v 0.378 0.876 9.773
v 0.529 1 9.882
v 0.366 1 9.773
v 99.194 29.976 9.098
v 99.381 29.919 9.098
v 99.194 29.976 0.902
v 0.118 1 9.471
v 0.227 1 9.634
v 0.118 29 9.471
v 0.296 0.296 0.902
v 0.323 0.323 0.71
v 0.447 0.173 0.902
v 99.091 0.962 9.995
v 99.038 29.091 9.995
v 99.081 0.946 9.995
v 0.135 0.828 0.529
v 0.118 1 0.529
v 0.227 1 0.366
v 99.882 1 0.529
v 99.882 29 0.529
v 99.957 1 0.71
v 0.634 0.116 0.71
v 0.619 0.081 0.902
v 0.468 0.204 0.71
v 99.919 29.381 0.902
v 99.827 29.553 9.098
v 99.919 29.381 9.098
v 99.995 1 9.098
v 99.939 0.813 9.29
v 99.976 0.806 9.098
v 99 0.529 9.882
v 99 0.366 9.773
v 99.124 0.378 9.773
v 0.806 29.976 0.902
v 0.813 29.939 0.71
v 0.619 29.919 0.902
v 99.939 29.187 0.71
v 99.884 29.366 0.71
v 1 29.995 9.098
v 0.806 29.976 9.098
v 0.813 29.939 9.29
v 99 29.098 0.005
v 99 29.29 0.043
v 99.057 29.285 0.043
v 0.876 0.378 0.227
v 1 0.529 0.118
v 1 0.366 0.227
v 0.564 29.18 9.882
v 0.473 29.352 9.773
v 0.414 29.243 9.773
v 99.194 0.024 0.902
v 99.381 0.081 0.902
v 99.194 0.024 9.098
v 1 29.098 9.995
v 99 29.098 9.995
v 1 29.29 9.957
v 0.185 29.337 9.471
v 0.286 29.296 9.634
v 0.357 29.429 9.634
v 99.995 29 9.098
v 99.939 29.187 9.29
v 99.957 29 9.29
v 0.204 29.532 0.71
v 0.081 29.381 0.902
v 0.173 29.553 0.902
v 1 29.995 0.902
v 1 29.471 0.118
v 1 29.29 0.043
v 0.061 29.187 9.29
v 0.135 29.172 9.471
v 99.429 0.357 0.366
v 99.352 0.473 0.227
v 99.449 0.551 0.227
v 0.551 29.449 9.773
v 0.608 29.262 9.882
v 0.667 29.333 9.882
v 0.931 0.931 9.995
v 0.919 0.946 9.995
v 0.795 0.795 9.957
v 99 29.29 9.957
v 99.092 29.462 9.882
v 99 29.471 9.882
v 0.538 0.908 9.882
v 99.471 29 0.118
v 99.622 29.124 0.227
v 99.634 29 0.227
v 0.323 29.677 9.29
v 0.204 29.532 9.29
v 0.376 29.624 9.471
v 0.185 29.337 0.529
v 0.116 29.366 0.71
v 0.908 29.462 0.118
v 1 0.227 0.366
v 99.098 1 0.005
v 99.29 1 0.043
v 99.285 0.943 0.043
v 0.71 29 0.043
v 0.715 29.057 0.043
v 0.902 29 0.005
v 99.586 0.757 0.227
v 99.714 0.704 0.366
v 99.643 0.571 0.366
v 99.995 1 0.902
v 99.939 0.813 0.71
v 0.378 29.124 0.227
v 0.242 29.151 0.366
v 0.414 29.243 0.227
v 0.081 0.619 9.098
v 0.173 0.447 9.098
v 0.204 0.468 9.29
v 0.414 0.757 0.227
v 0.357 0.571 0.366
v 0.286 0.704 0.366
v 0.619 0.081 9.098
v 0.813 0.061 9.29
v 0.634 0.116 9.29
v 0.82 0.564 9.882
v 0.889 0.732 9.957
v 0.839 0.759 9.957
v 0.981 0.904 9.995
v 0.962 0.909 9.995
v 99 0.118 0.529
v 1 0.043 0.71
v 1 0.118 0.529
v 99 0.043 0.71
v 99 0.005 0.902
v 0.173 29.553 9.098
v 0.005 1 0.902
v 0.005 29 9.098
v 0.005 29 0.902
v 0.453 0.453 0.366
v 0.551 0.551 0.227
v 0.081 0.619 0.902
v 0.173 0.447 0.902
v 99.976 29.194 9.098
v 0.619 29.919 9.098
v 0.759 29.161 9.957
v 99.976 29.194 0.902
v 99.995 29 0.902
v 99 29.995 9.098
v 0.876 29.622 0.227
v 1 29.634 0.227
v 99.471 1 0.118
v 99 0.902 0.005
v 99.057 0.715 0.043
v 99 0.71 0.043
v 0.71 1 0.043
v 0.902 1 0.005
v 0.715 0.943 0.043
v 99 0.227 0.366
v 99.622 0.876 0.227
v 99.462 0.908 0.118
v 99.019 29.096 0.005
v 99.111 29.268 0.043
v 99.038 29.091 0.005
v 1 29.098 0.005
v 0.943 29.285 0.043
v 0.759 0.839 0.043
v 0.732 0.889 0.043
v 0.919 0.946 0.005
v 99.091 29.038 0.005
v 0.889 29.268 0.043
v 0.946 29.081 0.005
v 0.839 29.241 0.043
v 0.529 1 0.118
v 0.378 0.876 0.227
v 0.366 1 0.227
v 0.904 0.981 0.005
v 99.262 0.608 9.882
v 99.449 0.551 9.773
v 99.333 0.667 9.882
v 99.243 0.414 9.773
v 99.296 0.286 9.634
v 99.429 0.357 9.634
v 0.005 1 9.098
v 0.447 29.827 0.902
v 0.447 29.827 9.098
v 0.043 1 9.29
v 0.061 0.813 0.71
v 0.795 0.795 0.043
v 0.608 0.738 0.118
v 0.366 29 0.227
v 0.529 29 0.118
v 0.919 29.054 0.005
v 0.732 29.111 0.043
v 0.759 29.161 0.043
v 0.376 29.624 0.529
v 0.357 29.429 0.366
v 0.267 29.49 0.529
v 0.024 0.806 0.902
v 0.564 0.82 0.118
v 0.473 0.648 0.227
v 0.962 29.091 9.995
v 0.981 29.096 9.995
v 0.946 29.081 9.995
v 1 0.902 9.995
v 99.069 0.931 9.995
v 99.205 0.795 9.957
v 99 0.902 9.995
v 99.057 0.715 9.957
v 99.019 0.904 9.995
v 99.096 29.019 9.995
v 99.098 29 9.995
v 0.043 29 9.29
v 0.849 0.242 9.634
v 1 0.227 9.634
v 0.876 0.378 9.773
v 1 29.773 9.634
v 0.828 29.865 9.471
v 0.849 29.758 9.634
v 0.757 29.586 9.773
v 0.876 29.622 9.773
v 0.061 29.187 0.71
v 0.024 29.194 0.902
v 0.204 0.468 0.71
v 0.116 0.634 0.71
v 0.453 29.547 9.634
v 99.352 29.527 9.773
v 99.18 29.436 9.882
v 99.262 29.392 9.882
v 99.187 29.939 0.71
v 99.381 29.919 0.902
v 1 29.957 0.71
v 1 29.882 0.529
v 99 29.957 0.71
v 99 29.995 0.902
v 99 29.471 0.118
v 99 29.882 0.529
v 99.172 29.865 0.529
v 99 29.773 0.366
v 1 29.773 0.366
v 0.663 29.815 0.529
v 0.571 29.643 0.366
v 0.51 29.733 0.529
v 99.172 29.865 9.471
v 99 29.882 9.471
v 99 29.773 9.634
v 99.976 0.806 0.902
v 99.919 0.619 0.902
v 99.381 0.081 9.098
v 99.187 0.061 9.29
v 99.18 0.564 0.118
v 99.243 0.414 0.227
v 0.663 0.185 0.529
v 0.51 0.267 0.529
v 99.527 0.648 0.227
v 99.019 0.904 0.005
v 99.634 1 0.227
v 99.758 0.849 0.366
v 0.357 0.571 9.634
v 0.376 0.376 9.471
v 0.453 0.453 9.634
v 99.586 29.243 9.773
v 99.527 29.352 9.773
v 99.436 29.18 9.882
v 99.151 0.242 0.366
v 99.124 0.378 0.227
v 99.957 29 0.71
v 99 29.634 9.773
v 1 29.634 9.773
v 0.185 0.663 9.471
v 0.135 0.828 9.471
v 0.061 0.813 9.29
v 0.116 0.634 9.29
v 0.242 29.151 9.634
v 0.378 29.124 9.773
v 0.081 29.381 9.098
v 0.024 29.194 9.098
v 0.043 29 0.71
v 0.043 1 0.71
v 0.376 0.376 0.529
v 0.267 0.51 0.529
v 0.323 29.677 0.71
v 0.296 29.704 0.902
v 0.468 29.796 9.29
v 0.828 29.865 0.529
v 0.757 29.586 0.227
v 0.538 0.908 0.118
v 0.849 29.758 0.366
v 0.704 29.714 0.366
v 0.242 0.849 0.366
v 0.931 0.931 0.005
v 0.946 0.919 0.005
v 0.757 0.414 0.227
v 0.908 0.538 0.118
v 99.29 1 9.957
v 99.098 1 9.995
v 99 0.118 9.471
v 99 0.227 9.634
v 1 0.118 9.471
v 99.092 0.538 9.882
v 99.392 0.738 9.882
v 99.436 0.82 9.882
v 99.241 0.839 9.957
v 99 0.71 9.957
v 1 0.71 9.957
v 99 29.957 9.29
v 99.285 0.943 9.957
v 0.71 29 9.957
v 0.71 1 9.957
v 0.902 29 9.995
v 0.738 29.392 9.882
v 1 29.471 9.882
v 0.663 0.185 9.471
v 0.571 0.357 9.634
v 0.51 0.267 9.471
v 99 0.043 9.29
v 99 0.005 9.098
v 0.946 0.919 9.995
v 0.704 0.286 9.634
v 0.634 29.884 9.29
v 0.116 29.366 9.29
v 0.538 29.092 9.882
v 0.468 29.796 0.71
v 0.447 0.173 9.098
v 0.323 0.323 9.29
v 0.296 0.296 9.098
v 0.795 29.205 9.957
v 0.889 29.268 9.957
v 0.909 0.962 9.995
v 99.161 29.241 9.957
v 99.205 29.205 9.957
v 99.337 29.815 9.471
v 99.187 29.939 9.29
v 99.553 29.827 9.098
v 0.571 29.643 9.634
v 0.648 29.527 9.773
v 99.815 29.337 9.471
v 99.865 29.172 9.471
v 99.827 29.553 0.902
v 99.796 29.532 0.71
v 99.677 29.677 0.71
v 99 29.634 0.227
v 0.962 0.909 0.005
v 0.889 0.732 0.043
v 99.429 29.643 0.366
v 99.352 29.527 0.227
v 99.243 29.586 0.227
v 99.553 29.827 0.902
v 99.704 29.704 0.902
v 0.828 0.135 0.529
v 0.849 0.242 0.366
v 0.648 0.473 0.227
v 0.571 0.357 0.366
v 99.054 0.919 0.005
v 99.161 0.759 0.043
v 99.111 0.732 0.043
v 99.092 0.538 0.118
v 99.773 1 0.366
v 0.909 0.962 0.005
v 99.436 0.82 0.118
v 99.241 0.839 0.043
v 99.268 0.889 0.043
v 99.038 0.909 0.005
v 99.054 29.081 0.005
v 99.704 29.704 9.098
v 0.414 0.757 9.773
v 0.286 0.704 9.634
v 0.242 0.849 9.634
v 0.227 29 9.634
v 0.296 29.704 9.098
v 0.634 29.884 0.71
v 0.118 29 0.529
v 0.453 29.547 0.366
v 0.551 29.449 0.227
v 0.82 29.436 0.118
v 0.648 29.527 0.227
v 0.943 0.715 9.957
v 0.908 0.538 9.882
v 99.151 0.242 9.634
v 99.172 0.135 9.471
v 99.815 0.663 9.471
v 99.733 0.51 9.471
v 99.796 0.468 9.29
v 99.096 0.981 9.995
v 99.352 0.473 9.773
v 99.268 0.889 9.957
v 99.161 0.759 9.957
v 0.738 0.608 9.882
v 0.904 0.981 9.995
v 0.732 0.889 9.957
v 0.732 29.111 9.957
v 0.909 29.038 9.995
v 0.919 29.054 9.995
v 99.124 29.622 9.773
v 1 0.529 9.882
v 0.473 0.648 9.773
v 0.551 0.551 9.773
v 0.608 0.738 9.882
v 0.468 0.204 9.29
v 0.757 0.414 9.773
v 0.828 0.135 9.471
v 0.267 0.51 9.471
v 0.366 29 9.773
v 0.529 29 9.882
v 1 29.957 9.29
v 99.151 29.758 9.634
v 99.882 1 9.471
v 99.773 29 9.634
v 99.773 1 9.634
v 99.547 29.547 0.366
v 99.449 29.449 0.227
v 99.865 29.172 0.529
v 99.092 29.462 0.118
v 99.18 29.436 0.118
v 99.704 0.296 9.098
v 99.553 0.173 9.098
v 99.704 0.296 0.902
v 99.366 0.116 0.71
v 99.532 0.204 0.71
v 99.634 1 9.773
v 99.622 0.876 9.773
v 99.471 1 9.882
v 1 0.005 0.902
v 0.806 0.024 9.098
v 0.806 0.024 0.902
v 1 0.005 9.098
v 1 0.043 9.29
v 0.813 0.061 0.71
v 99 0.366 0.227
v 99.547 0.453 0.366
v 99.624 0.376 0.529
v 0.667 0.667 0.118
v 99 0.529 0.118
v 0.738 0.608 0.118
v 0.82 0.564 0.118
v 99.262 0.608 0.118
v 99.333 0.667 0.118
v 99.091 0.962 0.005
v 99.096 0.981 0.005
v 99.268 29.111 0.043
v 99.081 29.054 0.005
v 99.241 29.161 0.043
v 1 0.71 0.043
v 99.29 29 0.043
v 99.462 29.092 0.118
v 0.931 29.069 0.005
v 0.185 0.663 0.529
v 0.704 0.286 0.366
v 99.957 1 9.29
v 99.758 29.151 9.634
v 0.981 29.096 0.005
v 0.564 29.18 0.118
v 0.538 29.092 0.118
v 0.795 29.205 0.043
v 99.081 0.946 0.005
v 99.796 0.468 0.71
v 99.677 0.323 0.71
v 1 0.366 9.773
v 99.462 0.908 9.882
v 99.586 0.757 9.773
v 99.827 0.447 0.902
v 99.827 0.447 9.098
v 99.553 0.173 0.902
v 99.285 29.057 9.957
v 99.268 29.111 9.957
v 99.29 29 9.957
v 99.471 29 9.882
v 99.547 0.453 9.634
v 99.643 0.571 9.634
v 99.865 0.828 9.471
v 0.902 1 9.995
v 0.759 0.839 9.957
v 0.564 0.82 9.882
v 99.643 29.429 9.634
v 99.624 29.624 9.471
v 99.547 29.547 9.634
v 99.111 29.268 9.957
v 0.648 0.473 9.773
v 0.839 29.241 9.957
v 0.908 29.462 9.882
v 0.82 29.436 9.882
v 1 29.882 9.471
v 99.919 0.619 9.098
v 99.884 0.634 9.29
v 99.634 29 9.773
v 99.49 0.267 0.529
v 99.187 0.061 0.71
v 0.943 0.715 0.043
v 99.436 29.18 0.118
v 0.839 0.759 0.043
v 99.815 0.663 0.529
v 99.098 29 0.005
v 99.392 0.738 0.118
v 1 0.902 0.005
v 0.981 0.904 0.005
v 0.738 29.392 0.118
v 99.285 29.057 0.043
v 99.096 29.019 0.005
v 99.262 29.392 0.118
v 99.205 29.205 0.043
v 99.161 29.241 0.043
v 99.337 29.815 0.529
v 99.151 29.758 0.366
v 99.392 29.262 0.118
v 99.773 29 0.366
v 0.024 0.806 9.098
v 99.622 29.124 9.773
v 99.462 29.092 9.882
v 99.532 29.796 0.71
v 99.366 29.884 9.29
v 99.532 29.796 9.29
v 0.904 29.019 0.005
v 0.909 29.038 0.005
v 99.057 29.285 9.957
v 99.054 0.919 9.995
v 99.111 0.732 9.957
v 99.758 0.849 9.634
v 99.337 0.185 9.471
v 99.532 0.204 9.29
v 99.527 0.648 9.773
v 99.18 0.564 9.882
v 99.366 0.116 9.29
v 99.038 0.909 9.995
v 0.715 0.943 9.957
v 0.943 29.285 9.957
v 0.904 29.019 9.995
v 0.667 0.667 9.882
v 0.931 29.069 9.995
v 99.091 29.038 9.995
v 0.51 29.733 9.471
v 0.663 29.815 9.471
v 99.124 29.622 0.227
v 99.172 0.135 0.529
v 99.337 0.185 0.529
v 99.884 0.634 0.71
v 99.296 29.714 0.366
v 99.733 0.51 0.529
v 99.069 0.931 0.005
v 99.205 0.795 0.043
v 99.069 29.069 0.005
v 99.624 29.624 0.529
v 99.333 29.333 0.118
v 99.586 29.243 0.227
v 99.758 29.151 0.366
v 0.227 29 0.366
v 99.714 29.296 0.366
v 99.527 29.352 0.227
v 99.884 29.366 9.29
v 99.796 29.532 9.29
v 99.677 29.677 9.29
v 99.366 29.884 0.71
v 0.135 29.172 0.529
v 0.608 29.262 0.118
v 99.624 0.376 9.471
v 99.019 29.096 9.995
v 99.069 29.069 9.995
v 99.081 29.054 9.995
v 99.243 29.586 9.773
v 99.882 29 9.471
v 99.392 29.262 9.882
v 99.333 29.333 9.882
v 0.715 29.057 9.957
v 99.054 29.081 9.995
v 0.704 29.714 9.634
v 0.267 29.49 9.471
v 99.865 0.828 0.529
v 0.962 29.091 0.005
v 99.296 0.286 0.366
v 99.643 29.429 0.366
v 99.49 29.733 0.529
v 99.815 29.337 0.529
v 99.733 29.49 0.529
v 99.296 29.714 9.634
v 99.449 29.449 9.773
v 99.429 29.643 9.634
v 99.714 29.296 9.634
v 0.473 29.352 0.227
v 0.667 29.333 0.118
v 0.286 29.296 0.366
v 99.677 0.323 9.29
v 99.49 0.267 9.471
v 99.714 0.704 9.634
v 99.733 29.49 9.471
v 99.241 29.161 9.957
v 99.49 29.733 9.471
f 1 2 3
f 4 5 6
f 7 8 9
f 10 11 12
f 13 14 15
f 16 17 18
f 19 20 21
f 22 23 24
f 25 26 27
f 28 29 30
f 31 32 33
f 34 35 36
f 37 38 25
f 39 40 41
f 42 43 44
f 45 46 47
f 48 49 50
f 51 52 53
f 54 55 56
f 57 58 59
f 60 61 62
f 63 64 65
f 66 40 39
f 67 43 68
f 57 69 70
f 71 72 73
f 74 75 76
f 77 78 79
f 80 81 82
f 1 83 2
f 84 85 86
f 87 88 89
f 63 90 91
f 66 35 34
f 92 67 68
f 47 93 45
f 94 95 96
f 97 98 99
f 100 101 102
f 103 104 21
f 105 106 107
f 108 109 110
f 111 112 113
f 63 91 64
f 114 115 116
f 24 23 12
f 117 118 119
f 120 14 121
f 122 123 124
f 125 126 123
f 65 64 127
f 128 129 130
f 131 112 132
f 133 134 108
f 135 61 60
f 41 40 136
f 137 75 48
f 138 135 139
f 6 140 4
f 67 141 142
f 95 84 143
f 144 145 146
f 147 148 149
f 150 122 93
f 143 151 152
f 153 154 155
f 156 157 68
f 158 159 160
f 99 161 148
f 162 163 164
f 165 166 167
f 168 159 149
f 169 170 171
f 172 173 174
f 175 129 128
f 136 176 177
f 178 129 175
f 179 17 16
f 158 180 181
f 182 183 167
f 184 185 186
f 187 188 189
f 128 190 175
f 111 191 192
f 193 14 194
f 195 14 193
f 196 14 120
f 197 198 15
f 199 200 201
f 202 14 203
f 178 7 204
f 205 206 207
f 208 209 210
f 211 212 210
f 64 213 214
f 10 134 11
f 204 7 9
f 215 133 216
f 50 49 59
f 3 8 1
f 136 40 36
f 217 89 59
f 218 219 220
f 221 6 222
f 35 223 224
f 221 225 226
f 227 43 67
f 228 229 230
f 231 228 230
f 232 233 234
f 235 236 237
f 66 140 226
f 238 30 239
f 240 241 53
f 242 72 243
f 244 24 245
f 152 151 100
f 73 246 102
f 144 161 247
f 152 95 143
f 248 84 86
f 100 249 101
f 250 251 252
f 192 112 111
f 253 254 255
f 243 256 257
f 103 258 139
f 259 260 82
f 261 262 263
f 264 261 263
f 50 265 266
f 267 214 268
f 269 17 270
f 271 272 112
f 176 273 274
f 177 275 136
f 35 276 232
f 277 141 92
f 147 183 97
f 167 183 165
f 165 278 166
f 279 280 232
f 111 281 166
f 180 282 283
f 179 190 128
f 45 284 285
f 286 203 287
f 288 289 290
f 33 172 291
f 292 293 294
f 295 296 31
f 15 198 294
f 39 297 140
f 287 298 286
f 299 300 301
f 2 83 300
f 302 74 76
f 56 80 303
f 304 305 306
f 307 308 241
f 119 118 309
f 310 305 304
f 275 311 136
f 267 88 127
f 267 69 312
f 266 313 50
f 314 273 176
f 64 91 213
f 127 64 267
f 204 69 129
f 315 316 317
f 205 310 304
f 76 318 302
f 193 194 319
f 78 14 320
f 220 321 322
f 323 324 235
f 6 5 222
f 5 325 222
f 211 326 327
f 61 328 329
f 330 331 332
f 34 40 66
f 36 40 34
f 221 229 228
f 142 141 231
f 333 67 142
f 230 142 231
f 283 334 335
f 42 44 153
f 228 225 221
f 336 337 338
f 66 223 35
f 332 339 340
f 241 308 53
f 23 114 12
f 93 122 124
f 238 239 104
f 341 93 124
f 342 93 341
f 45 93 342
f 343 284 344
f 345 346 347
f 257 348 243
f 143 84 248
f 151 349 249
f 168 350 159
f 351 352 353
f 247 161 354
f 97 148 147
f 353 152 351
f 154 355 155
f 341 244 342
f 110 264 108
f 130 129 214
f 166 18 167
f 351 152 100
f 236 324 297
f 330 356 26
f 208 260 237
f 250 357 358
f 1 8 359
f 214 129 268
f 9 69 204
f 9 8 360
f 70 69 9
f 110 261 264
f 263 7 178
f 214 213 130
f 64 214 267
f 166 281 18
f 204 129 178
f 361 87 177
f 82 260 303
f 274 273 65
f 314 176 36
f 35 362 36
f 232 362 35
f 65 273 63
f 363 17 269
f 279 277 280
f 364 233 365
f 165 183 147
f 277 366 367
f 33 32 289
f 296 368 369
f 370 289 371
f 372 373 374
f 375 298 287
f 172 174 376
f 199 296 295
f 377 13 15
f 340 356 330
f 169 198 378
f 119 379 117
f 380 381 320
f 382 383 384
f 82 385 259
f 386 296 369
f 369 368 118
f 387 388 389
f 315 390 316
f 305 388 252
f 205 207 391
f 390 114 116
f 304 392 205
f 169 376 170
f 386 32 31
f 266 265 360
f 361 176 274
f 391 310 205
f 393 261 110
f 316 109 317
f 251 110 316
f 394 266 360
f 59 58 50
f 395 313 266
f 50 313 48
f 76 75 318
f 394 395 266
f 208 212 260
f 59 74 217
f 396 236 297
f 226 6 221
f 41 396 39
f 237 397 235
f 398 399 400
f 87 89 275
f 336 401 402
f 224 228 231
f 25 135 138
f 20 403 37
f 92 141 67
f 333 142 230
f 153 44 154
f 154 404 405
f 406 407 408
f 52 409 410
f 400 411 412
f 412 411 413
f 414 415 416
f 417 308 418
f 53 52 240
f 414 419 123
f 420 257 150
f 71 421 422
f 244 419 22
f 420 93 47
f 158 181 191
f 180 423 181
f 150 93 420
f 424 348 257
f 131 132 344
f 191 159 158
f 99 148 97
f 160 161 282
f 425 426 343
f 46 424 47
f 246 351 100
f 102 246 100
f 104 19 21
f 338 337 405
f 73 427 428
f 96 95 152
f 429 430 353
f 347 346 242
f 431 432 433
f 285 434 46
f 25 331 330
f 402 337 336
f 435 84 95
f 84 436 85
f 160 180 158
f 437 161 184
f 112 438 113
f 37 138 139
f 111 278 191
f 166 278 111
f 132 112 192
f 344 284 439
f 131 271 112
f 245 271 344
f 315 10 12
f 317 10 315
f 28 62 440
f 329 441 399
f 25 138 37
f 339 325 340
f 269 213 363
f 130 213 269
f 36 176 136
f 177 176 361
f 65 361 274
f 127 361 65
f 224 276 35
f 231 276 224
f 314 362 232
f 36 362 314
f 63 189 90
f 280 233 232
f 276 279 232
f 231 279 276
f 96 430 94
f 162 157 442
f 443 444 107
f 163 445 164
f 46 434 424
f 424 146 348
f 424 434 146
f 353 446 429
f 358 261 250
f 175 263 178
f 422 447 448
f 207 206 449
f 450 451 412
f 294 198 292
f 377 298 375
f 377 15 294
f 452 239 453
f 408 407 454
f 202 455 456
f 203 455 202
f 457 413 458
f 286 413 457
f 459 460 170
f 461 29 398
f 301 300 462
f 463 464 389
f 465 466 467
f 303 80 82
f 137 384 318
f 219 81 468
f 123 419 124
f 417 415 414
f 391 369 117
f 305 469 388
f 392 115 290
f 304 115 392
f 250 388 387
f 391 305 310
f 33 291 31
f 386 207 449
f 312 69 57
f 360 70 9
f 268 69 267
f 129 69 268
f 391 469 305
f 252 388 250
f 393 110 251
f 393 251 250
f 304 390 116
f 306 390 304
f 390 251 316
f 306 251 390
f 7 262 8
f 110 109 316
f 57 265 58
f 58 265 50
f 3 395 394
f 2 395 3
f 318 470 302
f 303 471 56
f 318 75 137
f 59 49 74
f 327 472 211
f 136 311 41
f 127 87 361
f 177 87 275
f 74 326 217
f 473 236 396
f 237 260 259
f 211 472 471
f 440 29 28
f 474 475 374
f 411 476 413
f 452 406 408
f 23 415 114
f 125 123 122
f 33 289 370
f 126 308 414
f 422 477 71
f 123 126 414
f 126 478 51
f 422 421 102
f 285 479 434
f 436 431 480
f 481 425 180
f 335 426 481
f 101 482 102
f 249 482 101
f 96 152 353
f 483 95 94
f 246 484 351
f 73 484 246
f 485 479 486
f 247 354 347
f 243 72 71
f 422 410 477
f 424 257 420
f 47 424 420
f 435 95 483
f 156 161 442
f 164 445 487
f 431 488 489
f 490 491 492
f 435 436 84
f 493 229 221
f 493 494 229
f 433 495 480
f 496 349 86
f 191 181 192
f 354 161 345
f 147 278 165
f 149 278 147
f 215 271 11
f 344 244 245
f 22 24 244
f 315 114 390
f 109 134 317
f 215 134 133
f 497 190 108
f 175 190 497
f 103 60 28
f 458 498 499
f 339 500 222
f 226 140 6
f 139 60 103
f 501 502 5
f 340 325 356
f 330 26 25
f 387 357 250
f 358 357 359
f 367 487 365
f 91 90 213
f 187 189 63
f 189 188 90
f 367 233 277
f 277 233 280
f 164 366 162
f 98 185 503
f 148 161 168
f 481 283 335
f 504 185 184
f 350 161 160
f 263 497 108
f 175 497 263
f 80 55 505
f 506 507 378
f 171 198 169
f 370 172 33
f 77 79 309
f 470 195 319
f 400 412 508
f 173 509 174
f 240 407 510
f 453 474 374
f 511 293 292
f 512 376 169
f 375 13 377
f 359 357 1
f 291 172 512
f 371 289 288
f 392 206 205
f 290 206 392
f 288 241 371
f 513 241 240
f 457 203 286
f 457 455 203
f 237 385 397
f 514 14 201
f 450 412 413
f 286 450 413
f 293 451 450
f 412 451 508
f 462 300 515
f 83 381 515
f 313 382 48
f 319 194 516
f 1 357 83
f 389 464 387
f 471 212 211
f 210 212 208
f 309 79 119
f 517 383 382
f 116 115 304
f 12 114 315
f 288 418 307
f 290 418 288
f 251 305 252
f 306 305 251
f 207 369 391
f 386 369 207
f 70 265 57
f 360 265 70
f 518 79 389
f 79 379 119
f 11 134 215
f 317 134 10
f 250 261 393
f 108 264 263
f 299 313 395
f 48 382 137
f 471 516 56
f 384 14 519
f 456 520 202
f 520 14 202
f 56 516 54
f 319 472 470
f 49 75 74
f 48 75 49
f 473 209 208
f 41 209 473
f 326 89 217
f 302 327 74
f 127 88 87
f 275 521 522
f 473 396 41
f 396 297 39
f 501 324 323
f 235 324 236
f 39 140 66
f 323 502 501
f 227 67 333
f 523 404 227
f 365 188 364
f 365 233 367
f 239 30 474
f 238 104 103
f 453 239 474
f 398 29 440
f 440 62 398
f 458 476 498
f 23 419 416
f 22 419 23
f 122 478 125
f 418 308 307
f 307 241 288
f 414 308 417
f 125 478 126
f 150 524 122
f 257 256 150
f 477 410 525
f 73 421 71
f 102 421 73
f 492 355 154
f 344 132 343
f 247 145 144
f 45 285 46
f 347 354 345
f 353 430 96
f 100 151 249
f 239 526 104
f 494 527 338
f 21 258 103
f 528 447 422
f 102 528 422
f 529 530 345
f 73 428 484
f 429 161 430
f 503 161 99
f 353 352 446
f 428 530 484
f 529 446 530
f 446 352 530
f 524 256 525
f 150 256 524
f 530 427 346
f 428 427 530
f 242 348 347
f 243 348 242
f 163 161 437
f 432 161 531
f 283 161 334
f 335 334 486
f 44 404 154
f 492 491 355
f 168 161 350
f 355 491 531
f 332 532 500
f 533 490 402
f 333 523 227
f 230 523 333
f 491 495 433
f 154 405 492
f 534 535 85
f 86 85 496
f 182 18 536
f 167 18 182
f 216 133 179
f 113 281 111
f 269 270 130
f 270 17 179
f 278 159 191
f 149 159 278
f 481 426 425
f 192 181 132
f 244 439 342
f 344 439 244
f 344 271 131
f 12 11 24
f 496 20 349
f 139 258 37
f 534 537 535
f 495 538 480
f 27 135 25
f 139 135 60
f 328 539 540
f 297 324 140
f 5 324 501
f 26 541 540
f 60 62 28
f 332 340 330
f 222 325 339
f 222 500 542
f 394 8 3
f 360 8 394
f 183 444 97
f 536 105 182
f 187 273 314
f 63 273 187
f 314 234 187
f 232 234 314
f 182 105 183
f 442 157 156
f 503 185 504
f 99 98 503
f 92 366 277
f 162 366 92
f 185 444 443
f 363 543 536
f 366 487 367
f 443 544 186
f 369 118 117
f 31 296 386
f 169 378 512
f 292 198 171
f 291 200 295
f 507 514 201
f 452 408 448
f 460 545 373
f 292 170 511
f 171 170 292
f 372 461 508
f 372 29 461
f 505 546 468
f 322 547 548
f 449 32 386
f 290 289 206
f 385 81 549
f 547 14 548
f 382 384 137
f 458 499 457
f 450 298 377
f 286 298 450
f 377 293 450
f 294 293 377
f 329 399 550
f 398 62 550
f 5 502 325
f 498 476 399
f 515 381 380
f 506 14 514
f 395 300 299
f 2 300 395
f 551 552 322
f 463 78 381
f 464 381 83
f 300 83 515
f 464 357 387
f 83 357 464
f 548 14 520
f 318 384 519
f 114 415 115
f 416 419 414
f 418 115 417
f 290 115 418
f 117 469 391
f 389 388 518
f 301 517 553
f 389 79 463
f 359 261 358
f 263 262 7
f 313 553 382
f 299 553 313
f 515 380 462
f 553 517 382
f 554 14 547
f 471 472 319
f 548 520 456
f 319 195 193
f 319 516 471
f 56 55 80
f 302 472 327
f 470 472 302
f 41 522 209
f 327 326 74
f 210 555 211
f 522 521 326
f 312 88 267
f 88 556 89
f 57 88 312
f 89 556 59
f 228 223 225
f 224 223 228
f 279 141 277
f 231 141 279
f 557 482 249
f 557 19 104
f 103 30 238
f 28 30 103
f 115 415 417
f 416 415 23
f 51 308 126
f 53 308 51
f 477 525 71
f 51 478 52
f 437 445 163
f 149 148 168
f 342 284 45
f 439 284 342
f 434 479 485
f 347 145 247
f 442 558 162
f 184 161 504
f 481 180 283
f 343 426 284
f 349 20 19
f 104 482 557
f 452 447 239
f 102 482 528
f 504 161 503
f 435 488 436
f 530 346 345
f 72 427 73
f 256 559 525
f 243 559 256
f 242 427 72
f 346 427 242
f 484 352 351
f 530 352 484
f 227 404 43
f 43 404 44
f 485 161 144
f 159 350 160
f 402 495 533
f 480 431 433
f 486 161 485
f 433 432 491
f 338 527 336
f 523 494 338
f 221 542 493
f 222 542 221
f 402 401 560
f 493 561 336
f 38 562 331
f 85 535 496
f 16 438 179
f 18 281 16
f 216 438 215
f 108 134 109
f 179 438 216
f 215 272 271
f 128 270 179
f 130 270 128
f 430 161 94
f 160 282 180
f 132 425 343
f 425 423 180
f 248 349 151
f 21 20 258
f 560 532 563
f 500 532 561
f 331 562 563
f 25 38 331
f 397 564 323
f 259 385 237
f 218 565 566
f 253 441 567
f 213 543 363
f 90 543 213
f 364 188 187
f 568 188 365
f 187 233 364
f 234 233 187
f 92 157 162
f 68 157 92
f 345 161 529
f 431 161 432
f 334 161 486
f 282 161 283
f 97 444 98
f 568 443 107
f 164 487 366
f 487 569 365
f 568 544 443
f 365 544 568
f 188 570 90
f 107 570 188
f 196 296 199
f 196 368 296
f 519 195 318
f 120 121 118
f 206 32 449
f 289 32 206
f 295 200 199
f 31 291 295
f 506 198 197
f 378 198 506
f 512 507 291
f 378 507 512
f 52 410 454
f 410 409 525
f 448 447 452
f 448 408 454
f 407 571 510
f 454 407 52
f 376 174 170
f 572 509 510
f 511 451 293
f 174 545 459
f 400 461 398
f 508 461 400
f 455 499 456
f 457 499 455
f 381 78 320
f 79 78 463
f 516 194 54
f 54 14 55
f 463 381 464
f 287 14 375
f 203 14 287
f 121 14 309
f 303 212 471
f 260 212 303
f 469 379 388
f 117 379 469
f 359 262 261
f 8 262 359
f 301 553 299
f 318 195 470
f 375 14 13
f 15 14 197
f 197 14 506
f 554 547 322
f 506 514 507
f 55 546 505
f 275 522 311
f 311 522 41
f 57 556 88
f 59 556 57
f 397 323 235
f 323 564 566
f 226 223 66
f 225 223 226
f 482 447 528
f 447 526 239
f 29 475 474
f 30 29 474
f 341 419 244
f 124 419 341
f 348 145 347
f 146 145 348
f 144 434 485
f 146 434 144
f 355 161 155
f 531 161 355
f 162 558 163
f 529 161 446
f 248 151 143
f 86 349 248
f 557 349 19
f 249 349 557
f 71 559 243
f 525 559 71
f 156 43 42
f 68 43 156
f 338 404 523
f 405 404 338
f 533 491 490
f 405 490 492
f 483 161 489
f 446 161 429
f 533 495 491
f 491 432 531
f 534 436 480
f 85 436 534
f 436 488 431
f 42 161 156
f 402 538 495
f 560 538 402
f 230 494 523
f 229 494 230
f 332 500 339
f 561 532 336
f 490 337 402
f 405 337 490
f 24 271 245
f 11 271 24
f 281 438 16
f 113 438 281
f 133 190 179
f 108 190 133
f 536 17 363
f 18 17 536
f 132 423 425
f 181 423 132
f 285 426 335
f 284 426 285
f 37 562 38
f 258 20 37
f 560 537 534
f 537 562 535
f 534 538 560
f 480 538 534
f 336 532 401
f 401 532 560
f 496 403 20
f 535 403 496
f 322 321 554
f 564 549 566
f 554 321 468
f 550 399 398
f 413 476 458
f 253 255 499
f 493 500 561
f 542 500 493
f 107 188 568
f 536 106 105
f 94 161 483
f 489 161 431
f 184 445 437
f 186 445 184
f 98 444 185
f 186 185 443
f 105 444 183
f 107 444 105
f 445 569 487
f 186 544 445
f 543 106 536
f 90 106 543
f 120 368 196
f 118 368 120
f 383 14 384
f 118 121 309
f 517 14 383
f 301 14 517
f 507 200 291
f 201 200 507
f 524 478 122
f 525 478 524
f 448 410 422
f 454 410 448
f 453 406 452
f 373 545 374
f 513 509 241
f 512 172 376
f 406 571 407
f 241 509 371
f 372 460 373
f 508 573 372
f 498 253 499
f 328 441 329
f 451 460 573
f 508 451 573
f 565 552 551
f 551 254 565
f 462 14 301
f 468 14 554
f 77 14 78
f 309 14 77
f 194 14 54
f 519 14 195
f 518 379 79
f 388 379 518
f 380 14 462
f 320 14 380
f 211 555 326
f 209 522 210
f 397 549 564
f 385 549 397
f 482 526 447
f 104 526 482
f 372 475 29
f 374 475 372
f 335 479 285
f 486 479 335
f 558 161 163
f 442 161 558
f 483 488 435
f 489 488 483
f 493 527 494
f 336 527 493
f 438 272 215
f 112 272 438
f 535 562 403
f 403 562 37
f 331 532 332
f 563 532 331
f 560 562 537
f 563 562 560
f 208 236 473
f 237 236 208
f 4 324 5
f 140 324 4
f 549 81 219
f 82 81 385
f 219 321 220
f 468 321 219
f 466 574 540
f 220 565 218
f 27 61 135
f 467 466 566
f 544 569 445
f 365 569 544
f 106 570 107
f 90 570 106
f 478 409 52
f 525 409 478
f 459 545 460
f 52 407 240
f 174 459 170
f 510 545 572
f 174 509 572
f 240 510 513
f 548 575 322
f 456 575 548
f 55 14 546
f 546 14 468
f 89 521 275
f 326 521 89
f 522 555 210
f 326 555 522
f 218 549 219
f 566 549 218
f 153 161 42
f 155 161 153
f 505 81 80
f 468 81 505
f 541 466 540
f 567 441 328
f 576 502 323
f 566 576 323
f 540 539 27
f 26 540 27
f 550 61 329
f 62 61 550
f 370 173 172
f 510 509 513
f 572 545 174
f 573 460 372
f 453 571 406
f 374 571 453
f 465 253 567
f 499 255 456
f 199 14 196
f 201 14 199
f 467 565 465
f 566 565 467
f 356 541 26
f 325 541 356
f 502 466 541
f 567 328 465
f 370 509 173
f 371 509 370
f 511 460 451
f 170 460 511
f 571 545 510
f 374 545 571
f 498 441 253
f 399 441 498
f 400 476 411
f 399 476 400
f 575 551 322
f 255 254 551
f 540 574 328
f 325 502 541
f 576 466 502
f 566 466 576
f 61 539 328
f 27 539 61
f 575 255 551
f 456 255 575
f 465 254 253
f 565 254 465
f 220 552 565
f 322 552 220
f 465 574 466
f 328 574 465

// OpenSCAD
/*
 * Monteringsplate for terminalblokk, typisk brukt i bil.
 *
 * Skrevet av Roy Sigurd Karlsbakk <roy@karlsbakk.net>
 *
 * Lisensiert under Creative Commons BY-NC-SA
 *   https://creativecommons.org/licenses/by-nc-sa/4.0/deed.no
 */

// Moduler
module roundedcube(size, radius) {
    translate([radius,radius,radius]) {
        hull() 
        {
            for (z = [0, size[2]-radius*2]) {
                translate([0, 0, z]) sphere(r=radius);
                translate([size[0]-radius*2, 0, z]) sphere(r=radius);
                translate([0, size[1]-radius*2, z]) sphere(r=radius);
                translate([size[0]-radius*2, size[1]-radius*2, z]) sphere(r=radius);
            }
        }
    }
}

// Variabler

// Antall fasetter på en sirkel
$fn = 32;

// Monteringsplata, ytre mål.
platebredde = 150;
platedybde = 40;
platehoyde = 10;

// Indre ramme for montering av terminalblokk. Dette er indre mål, 
// så ytre mål blir indre + rammetykkelse * 2
rammehoyde = platehoyde;
rammebredde = 100;
rammedybde = 30;
rammetykkelse = 3;

// Ymse
avrunding = 1;

// Programkode
roundedcube([rammebredde,rammedybde,rammehoyde], avrunding);
